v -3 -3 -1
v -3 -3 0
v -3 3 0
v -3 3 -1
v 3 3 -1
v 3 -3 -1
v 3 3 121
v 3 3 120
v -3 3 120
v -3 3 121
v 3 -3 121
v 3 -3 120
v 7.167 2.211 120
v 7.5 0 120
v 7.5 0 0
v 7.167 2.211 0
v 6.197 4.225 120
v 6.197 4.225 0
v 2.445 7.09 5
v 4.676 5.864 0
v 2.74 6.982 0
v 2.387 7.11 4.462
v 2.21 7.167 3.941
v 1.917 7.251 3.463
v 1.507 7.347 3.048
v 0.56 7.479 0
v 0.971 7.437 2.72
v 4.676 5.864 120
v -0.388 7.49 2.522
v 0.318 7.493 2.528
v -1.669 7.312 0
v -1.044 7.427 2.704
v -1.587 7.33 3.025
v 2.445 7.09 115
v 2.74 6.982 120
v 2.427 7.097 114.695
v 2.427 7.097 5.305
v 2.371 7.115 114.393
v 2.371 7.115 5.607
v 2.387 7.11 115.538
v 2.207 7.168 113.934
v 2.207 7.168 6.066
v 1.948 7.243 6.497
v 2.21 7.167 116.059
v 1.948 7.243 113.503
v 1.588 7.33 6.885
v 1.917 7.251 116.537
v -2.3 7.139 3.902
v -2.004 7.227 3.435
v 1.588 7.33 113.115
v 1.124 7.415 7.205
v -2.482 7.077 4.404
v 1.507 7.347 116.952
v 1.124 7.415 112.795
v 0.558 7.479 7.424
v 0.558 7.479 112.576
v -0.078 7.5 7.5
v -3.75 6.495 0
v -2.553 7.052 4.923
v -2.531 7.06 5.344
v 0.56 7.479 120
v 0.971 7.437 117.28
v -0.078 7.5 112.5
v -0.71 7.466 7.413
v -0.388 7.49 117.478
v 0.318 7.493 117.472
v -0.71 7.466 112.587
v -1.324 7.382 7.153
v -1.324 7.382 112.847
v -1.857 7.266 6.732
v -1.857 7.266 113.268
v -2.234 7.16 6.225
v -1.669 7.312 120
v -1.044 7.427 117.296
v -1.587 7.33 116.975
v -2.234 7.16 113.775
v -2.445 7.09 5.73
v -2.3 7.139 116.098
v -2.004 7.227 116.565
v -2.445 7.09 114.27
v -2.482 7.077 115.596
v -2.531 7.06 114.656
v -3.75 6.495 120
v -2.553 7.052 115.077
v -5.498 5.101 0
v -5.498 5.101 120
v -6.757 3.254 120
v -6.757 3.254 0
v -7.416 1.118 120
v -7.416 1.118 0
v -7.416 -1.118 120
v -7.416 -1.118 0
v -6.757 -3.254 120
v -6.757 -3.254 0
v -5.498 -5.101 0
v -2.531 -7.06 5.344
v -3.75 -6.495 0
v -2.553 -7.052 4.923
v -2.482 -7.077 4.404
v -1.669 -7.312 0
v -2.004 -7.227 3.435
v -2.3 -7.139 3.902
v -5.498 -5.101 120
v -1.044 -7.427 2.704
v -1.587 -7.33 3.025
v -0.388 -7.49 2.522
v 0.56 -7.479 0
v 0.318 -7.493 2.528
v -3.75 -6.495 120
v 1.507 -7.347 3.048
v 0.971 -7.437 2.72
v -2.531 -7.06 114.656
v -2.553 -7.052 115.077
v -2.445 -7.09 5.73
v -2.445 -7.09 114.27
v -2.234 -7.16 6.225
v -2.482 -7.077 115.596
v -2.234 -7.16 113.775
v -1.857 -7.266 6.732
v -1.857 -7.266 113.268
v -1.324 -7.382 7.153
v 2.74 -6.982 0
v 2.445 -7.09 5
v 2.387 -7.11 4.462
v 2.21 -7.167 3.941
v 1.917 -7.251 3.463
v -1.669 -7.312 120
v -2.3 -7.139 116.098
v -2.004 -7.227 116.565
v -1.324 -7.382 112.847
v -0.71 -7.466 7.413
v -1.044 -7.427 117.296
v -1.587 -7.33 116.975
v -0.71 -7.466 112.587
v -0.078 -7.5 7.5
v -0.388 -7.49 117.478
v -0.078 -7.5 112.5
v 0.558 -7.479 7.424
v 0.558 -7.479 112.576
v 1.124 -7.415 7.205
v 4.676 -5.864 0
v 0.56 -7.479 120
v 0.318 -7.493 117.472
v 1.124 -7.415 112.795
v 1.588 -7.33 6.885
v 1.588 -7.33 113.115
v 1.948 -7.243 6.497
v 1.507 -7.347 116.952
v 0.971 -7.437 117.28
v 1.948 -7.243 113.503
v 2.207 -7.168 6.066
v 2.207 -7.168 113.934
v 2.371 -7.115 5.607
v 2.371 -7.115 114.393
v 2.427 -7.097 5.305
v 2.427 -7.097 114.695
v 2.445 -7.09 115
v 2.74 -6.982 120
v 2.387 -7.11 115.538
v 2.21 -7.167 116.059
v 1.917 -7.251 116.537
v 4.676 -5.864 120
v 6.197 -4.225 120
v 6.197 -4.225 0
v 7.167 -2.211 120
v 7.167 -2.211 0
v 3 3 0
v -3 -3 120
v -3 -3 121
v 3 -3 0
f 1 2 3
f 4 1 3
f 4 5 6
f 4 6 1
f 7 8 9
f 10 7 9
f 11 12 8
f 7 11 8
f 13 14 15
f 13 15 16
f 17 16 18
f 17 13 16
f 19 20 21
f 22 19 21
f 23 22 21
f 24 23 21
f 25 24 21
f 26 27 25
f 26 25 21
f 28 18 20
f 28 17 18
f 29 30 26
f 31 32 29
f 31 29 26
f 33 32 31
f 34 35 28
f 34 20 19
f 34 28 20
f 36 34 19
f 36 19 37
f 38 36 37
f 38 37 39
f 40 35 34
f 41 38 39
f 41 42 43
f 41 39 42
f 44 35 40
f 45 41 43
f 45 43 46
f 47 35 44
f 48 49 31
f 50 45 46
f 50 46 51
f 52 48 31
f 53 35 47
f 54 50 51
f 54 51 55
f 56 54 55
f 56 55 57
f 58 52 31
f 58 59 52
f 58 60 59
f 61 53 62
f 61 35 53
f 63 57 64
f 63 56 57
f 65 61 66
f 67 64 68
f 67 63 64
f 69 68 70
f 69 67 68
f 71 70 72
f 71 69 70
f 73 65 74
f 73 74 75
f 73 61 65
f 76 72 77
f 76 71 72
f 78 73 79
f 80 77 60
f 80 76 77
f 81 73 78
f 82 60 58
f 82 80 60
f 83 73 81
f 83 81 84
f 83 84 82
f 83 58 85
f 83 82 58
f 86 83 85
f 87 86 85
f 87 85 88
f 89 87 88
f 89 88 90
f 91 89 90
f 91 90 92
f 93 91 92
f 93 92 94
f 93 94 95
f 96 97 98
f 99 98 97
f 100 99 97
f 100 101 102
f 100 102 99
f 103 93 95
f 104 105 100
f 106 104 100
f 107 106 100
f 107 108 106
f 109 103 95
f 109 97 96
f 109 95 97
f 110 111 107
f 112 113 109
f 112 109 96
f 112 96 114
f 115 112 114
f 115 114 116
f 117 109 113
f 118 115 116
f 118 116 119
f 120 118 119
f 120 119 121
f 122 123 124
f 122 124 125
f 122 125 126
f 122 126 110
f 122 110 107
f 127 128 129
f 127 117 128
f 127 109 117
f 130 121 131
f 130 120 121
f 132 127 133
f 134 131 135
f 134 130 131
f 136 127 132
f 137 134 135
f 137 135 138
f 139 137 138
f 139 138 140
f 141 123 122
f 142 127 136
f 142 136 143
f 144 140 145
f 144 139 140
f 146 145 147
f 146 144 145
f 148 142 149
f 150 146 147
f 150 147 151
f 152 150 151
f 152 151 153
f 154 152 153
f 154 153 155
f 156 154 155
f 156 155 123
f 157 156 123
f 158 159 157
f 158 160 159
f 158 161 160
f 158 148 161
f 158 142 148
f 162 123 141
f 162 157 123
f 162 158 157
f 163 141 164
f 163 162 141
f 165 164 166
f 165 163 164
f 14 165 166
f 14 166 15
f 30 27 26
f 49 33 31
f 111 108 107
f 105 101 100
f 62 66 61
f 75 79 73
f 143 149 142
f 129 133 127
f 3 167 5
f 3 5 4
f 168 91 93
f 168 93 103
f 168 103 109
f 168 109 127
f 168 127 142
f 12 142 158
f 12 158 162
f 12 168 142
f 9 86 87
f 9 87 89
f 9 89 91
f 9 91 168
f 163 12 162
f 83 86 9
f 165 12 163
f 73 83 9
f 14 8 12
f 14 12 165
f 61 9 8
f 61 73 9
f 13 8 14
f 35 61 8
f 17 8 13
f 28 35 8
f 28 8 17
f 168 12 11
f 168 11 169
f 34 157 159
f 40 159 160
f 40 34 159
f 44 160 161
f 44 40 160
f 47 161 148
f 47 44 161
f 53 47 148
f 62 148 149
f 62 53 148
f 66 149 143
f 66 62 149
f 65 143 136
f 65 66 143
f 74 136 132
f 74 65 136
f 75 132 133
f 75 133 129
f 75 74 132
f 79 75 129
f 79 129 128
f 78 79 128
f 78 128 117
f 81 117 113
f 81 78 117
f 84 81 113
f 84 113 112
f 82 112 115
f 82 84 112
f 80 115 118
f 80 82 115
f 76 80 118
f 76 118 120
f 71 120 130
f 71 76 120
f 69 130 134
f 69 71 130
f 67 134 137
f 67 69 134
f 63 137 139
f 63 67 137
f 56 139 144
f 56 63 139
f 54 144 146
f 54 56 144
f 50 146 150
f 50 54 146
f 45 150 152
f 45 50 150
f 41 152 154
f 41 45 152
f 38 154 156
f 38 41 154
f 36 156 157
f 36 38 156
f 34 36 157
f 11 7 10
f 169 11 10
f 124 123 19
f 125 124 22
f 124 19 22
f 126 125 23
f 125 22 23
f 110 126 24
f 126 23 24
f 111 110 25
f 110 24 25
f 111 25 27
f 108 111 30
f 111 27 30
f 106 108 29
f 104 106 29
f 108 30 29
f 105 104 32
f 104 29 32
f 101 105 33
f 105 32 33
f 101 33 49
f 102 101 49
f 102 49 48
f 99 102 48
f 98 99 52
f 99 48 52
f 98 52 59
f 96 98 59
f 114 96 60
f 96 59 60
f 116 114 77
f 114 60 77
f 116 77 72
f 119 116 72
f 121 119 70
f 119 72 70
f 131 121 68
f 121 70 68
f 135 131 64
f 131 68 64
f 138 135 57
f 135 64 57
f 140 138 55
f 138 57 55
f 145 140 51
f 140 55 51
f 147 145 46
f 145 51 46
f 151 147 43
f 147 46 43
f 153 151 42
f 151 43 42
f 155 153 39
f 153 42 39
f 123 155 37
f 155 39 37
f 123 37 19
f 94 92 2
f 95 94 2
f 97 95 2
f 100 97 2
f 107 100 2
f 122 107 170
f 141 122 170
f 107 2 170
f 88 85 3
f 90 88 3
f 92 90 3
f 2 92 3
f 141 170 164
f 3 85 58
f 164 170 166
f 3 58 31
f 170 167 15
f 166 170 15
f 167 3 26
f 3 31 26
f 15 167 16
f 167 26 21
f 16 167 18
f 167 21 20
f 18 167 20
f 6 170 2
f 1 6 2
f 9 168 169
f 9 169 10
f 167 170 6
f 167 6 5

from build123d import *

# Parameters (mm, degrees)
ESQUISSE1_R                 = 7.5
BOSS_EXTRU_1_DEPTH          = 60
ESQUISSE6_W                 = 6
ESQUISSE6_H                 = 6
BOSS_EXTRU_2_DEPTH          = 1
ENL_V_MAT_EXTRU_2_OUTLINE_W = 2.5
ENL_V_MAT_EXTRU_2_OUTLINE_H = 15.000451996


# Read off the part's stored shape, not the designer's step: Enlèv. mat.-Extru.2
with BuildPart() as part:
    # Esquisse1 → Boss.-Extru.1 (new body)
    with BuildSketch(Plane.XY):
        Circle(ESQUISSE1_R)
    boss_extru_1 = extrude(amount=BOSS_EXTRU_1_DEPTH)

    # Esquisse6 → Boss.-Extru.2 (add)
    with BuildSketch(Plane(origin=(0, 0, 0), x_dir=(-1, 0, 0), z_dir=(0, 0, -1))):
        Rectangle(ESQUISSE6_W, ESQUISSE6_H)
    boss_extru_2 = extrude(amount=BOSS_EXTRU_2_DEPTH)

    # Enlèv. mat.-Extru.2 outline → Enlèv. mat.-Extru.2 (revolve, cut)
    with BuildSketch(Plane(origin=(-0.054510378, 0, 5), x_dir=(1, 0, 0), z_dir=(0, 0, 1))):
        with Locations((1.25, 0)):
            Rectangle(ENL_V_MAT_EXTRU_2_OUTLINE_W, ENL_V_MAT_EXTRU_2_OUTLINE_H)
    enl_v_mat_extru_2 = revolve(axis=Axis((-0.054510378, 0, 5), (0, 1, 0)), mode=Mode.SUBTRACT)

    # Symétrie4: Boss.-Extru.1, Boss.-Extru.2, Enlèv. mat.-Extru.2 across plane
    add(boss_extru_1.mirror(Plane.XY.offset(60)))
    add(boss_extru_2.mirror(Plane.XY.offset(60)))
    add(enl_v_mat_extru_2.mirror(Plane.XY.offset(60)), mode=Mode.SUBTRACT)


solid = part.part
